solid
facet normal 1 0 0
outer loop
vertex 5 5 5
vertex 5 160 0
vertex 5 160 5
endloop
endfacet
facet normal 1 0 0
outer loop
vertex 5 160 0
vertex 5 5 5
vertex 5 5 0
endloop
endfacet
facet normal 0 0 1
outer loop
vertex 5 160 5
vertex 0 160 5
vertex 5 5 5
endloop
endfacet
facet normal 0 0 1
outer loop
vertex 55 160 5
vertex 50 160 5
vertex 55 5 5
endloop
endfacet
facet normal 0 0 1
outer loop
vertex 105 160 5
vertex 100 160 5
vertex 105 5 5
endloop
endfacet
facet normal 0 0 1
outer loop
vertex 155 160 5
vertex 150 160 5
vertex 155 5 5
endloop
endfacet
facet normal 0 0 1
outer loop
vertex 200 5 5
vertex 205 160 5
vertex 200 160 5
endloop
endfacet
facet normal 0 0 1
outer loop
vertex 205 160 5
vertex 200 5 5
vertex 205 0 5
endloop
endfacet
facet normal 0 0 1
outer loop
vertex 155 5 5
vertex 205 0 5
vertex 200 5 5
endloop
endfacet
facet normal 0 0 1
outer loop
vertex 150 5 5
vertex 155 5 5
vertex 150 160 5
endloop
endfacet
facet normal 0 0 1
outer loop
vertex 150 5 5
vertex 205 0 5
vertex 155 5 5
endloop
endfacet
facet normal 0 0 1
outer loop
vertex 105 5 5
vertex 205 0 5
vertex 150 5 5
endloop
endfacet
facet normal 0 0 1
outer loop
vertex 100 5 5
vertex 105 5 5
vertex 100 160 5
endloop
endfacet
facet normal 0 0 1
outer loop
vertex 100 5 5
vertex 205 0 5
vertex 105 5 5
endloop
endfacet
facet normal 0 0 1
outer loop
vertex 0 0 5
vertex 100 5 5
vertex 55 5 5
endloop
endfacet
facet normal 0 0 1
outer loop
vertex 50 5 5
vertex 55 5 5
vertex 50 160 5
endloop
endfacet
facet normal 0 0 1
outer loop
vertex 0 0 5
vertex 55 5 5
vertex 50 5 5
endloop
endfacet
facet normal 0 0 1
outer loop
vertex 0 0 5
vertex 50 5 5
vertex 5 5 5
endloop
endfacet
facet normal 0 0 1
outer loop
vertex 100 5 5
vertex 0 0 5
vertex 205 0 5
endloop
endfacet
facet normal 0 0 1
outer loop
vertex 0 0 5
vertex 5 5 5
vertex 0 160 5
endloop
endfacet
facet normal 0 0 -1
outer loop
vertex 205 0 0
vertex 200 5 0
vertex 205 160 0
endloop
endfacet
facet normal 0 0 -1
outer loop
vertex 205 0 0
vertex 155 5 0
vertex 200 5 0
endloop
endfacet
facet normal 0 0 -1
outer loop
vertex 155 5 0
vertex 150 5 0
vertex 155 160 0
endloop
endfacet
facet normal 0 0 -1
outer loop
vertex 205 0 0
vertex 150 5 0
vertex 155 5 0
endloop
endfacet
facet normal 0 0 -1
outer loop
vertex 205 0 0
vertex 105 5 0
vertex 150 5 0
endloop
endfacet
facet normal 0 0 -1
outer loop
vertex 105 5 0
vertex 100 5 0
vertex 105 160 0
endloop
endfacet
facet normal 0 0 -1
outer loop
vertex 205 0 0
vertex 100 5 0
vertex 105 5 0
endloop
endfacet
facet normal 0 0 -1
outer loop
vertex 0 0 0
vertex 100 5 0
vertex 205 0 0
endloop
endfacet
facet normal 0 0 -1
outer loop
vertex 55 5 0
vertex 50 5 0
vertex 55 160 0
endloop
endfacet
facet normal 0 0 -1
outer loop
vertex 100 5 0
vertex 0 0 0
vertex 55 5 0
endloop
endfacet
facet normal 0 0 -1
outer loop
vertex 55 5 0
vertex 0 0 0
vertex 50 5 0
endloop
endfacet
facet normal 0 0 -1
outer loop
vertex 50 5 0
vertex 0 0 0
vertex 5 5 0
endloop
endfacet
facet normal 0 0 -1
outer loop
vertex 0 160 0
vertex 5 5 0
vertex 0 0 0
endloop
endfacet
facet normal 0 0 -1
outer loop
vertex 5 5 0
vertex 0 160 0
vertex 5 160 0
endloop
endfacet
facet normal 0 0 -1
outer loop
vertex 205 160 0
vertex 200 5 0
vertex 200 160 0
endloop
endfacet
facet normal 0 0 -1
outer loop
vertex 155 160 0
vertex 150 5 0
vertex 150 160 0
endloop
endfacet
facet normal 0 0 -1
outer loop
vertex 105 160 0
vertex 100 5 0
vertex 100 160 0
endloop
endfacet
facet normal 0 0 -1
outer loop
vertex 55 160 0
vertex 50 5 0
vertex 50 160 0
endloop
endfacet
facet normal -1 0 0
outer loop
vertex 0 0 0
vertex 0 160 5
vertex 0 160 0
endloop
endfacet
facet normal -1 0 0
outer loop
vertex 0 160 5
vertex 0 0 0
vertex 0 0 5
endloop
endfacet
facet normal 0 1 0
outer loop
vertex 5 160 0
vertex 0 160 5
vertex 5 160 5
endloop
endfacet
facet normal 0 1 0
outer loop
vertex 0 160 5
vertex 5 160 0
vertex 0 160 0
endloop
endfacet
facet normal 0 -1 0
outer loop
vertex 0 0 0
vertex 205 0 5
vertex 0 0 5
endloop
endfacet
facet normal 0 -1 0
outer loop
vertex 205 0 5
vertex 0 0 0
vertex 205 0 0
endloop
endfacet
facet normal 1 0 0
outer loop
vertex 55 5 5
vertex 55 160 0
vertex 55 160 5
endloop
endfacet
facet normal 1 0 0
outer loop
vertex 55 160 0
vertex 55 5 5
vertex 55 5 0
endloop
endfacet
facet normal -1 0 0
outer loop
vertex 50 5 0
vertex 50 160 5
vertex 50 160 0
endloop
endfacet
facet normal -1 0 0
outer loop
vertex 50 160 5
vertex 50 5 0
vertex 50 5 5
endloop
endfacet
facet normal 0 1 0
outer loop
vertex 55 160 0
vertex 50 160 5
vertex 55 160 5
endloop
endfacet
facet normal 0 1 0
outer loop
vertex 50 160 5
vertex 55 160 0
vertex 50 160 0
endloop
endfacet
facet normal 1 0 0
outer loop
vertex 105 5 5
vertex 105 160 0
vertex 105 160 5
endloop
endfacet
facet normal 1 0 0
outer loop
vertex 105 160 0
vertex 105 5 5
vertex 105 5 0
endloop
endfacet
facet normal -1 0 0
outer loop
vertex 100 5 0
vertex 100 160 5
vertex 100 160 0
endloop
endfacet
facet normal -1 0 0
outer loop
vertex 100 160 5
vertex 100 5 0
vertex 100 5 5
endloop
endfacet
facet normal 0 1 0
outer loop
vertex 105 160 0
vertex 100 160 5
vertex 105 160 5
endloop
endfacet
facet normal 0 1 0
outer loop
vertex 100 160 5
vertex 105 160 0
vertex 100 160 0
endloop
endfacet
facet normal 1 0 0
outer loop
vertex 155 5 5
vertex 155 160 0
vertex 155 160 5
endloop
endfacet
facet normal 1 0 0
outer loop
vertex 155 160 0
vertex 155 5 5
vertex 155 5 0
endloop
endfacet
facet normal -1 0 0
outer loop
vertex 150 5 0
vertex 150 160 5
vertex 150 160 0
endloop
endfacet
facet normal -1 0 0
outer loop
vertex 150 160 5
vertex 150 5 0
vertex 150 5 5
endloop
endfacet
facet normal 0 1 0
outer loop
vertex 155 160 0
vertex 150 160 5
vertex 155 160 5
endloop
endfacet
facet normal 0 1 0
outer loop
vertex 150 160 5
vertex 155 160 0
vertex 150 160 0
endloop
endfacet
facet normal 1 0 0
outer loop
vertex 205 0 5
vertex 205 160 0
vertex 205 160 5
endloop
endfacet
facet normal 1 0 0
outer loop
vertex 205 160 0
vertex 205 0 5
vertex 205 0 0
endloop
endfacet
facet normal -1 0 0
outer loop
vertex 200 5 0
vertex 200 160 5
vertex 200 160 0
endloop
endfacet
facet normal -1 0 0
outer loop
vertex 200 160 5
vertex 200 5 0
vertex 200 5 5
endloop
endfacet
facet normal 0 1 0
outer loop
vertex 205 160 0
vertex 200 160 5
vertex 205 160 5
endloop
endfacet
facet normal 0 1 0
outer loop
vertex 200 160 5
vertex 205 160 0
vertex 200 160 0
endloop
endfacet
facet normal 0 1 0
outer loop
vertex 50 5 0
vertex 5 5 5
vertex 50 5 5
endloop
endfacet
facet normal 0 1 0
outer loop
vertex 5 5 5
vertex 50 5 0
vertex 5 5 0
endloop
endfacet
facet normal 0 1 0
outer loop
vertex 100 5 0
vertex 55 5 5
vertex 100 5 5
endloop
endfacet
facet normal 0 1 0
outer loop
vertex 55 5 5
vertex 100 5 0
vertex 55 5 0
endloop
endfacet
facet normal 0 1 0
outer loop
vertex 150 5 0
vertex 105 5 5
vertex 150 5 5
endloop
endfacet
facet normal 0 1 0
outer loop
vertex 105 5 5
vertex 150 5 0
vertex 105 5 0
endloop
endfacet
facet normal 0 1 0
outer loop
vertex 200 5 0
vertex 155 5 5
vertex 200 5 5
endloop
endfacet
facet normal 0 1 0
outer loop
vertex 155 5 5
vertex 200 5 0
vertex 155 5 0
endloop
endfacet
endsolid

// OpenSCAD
for(x=[0:50:200])
  translate([x,0,0]) cube([5,160,5]);
cube([205,5,5]);
module centerpiece() {
rotate_extrude($fn=50) {
  difference() {
    square([10,30]);
    translate([36,15]) circle(r=30,$fn=80);
  }
}
}
module leg() {
intersection() {
  square([40,50]);
  outline(3) {
    translate([36,40]) circle(r=30,$fn=80);
  }
}
}
module outline(dist=2)
{
  difference() {
    minkowski() {
      children();
      translate([dist*-.5,dist*-.5]) square([dist,dist]);
    }
    children();
  }
}
